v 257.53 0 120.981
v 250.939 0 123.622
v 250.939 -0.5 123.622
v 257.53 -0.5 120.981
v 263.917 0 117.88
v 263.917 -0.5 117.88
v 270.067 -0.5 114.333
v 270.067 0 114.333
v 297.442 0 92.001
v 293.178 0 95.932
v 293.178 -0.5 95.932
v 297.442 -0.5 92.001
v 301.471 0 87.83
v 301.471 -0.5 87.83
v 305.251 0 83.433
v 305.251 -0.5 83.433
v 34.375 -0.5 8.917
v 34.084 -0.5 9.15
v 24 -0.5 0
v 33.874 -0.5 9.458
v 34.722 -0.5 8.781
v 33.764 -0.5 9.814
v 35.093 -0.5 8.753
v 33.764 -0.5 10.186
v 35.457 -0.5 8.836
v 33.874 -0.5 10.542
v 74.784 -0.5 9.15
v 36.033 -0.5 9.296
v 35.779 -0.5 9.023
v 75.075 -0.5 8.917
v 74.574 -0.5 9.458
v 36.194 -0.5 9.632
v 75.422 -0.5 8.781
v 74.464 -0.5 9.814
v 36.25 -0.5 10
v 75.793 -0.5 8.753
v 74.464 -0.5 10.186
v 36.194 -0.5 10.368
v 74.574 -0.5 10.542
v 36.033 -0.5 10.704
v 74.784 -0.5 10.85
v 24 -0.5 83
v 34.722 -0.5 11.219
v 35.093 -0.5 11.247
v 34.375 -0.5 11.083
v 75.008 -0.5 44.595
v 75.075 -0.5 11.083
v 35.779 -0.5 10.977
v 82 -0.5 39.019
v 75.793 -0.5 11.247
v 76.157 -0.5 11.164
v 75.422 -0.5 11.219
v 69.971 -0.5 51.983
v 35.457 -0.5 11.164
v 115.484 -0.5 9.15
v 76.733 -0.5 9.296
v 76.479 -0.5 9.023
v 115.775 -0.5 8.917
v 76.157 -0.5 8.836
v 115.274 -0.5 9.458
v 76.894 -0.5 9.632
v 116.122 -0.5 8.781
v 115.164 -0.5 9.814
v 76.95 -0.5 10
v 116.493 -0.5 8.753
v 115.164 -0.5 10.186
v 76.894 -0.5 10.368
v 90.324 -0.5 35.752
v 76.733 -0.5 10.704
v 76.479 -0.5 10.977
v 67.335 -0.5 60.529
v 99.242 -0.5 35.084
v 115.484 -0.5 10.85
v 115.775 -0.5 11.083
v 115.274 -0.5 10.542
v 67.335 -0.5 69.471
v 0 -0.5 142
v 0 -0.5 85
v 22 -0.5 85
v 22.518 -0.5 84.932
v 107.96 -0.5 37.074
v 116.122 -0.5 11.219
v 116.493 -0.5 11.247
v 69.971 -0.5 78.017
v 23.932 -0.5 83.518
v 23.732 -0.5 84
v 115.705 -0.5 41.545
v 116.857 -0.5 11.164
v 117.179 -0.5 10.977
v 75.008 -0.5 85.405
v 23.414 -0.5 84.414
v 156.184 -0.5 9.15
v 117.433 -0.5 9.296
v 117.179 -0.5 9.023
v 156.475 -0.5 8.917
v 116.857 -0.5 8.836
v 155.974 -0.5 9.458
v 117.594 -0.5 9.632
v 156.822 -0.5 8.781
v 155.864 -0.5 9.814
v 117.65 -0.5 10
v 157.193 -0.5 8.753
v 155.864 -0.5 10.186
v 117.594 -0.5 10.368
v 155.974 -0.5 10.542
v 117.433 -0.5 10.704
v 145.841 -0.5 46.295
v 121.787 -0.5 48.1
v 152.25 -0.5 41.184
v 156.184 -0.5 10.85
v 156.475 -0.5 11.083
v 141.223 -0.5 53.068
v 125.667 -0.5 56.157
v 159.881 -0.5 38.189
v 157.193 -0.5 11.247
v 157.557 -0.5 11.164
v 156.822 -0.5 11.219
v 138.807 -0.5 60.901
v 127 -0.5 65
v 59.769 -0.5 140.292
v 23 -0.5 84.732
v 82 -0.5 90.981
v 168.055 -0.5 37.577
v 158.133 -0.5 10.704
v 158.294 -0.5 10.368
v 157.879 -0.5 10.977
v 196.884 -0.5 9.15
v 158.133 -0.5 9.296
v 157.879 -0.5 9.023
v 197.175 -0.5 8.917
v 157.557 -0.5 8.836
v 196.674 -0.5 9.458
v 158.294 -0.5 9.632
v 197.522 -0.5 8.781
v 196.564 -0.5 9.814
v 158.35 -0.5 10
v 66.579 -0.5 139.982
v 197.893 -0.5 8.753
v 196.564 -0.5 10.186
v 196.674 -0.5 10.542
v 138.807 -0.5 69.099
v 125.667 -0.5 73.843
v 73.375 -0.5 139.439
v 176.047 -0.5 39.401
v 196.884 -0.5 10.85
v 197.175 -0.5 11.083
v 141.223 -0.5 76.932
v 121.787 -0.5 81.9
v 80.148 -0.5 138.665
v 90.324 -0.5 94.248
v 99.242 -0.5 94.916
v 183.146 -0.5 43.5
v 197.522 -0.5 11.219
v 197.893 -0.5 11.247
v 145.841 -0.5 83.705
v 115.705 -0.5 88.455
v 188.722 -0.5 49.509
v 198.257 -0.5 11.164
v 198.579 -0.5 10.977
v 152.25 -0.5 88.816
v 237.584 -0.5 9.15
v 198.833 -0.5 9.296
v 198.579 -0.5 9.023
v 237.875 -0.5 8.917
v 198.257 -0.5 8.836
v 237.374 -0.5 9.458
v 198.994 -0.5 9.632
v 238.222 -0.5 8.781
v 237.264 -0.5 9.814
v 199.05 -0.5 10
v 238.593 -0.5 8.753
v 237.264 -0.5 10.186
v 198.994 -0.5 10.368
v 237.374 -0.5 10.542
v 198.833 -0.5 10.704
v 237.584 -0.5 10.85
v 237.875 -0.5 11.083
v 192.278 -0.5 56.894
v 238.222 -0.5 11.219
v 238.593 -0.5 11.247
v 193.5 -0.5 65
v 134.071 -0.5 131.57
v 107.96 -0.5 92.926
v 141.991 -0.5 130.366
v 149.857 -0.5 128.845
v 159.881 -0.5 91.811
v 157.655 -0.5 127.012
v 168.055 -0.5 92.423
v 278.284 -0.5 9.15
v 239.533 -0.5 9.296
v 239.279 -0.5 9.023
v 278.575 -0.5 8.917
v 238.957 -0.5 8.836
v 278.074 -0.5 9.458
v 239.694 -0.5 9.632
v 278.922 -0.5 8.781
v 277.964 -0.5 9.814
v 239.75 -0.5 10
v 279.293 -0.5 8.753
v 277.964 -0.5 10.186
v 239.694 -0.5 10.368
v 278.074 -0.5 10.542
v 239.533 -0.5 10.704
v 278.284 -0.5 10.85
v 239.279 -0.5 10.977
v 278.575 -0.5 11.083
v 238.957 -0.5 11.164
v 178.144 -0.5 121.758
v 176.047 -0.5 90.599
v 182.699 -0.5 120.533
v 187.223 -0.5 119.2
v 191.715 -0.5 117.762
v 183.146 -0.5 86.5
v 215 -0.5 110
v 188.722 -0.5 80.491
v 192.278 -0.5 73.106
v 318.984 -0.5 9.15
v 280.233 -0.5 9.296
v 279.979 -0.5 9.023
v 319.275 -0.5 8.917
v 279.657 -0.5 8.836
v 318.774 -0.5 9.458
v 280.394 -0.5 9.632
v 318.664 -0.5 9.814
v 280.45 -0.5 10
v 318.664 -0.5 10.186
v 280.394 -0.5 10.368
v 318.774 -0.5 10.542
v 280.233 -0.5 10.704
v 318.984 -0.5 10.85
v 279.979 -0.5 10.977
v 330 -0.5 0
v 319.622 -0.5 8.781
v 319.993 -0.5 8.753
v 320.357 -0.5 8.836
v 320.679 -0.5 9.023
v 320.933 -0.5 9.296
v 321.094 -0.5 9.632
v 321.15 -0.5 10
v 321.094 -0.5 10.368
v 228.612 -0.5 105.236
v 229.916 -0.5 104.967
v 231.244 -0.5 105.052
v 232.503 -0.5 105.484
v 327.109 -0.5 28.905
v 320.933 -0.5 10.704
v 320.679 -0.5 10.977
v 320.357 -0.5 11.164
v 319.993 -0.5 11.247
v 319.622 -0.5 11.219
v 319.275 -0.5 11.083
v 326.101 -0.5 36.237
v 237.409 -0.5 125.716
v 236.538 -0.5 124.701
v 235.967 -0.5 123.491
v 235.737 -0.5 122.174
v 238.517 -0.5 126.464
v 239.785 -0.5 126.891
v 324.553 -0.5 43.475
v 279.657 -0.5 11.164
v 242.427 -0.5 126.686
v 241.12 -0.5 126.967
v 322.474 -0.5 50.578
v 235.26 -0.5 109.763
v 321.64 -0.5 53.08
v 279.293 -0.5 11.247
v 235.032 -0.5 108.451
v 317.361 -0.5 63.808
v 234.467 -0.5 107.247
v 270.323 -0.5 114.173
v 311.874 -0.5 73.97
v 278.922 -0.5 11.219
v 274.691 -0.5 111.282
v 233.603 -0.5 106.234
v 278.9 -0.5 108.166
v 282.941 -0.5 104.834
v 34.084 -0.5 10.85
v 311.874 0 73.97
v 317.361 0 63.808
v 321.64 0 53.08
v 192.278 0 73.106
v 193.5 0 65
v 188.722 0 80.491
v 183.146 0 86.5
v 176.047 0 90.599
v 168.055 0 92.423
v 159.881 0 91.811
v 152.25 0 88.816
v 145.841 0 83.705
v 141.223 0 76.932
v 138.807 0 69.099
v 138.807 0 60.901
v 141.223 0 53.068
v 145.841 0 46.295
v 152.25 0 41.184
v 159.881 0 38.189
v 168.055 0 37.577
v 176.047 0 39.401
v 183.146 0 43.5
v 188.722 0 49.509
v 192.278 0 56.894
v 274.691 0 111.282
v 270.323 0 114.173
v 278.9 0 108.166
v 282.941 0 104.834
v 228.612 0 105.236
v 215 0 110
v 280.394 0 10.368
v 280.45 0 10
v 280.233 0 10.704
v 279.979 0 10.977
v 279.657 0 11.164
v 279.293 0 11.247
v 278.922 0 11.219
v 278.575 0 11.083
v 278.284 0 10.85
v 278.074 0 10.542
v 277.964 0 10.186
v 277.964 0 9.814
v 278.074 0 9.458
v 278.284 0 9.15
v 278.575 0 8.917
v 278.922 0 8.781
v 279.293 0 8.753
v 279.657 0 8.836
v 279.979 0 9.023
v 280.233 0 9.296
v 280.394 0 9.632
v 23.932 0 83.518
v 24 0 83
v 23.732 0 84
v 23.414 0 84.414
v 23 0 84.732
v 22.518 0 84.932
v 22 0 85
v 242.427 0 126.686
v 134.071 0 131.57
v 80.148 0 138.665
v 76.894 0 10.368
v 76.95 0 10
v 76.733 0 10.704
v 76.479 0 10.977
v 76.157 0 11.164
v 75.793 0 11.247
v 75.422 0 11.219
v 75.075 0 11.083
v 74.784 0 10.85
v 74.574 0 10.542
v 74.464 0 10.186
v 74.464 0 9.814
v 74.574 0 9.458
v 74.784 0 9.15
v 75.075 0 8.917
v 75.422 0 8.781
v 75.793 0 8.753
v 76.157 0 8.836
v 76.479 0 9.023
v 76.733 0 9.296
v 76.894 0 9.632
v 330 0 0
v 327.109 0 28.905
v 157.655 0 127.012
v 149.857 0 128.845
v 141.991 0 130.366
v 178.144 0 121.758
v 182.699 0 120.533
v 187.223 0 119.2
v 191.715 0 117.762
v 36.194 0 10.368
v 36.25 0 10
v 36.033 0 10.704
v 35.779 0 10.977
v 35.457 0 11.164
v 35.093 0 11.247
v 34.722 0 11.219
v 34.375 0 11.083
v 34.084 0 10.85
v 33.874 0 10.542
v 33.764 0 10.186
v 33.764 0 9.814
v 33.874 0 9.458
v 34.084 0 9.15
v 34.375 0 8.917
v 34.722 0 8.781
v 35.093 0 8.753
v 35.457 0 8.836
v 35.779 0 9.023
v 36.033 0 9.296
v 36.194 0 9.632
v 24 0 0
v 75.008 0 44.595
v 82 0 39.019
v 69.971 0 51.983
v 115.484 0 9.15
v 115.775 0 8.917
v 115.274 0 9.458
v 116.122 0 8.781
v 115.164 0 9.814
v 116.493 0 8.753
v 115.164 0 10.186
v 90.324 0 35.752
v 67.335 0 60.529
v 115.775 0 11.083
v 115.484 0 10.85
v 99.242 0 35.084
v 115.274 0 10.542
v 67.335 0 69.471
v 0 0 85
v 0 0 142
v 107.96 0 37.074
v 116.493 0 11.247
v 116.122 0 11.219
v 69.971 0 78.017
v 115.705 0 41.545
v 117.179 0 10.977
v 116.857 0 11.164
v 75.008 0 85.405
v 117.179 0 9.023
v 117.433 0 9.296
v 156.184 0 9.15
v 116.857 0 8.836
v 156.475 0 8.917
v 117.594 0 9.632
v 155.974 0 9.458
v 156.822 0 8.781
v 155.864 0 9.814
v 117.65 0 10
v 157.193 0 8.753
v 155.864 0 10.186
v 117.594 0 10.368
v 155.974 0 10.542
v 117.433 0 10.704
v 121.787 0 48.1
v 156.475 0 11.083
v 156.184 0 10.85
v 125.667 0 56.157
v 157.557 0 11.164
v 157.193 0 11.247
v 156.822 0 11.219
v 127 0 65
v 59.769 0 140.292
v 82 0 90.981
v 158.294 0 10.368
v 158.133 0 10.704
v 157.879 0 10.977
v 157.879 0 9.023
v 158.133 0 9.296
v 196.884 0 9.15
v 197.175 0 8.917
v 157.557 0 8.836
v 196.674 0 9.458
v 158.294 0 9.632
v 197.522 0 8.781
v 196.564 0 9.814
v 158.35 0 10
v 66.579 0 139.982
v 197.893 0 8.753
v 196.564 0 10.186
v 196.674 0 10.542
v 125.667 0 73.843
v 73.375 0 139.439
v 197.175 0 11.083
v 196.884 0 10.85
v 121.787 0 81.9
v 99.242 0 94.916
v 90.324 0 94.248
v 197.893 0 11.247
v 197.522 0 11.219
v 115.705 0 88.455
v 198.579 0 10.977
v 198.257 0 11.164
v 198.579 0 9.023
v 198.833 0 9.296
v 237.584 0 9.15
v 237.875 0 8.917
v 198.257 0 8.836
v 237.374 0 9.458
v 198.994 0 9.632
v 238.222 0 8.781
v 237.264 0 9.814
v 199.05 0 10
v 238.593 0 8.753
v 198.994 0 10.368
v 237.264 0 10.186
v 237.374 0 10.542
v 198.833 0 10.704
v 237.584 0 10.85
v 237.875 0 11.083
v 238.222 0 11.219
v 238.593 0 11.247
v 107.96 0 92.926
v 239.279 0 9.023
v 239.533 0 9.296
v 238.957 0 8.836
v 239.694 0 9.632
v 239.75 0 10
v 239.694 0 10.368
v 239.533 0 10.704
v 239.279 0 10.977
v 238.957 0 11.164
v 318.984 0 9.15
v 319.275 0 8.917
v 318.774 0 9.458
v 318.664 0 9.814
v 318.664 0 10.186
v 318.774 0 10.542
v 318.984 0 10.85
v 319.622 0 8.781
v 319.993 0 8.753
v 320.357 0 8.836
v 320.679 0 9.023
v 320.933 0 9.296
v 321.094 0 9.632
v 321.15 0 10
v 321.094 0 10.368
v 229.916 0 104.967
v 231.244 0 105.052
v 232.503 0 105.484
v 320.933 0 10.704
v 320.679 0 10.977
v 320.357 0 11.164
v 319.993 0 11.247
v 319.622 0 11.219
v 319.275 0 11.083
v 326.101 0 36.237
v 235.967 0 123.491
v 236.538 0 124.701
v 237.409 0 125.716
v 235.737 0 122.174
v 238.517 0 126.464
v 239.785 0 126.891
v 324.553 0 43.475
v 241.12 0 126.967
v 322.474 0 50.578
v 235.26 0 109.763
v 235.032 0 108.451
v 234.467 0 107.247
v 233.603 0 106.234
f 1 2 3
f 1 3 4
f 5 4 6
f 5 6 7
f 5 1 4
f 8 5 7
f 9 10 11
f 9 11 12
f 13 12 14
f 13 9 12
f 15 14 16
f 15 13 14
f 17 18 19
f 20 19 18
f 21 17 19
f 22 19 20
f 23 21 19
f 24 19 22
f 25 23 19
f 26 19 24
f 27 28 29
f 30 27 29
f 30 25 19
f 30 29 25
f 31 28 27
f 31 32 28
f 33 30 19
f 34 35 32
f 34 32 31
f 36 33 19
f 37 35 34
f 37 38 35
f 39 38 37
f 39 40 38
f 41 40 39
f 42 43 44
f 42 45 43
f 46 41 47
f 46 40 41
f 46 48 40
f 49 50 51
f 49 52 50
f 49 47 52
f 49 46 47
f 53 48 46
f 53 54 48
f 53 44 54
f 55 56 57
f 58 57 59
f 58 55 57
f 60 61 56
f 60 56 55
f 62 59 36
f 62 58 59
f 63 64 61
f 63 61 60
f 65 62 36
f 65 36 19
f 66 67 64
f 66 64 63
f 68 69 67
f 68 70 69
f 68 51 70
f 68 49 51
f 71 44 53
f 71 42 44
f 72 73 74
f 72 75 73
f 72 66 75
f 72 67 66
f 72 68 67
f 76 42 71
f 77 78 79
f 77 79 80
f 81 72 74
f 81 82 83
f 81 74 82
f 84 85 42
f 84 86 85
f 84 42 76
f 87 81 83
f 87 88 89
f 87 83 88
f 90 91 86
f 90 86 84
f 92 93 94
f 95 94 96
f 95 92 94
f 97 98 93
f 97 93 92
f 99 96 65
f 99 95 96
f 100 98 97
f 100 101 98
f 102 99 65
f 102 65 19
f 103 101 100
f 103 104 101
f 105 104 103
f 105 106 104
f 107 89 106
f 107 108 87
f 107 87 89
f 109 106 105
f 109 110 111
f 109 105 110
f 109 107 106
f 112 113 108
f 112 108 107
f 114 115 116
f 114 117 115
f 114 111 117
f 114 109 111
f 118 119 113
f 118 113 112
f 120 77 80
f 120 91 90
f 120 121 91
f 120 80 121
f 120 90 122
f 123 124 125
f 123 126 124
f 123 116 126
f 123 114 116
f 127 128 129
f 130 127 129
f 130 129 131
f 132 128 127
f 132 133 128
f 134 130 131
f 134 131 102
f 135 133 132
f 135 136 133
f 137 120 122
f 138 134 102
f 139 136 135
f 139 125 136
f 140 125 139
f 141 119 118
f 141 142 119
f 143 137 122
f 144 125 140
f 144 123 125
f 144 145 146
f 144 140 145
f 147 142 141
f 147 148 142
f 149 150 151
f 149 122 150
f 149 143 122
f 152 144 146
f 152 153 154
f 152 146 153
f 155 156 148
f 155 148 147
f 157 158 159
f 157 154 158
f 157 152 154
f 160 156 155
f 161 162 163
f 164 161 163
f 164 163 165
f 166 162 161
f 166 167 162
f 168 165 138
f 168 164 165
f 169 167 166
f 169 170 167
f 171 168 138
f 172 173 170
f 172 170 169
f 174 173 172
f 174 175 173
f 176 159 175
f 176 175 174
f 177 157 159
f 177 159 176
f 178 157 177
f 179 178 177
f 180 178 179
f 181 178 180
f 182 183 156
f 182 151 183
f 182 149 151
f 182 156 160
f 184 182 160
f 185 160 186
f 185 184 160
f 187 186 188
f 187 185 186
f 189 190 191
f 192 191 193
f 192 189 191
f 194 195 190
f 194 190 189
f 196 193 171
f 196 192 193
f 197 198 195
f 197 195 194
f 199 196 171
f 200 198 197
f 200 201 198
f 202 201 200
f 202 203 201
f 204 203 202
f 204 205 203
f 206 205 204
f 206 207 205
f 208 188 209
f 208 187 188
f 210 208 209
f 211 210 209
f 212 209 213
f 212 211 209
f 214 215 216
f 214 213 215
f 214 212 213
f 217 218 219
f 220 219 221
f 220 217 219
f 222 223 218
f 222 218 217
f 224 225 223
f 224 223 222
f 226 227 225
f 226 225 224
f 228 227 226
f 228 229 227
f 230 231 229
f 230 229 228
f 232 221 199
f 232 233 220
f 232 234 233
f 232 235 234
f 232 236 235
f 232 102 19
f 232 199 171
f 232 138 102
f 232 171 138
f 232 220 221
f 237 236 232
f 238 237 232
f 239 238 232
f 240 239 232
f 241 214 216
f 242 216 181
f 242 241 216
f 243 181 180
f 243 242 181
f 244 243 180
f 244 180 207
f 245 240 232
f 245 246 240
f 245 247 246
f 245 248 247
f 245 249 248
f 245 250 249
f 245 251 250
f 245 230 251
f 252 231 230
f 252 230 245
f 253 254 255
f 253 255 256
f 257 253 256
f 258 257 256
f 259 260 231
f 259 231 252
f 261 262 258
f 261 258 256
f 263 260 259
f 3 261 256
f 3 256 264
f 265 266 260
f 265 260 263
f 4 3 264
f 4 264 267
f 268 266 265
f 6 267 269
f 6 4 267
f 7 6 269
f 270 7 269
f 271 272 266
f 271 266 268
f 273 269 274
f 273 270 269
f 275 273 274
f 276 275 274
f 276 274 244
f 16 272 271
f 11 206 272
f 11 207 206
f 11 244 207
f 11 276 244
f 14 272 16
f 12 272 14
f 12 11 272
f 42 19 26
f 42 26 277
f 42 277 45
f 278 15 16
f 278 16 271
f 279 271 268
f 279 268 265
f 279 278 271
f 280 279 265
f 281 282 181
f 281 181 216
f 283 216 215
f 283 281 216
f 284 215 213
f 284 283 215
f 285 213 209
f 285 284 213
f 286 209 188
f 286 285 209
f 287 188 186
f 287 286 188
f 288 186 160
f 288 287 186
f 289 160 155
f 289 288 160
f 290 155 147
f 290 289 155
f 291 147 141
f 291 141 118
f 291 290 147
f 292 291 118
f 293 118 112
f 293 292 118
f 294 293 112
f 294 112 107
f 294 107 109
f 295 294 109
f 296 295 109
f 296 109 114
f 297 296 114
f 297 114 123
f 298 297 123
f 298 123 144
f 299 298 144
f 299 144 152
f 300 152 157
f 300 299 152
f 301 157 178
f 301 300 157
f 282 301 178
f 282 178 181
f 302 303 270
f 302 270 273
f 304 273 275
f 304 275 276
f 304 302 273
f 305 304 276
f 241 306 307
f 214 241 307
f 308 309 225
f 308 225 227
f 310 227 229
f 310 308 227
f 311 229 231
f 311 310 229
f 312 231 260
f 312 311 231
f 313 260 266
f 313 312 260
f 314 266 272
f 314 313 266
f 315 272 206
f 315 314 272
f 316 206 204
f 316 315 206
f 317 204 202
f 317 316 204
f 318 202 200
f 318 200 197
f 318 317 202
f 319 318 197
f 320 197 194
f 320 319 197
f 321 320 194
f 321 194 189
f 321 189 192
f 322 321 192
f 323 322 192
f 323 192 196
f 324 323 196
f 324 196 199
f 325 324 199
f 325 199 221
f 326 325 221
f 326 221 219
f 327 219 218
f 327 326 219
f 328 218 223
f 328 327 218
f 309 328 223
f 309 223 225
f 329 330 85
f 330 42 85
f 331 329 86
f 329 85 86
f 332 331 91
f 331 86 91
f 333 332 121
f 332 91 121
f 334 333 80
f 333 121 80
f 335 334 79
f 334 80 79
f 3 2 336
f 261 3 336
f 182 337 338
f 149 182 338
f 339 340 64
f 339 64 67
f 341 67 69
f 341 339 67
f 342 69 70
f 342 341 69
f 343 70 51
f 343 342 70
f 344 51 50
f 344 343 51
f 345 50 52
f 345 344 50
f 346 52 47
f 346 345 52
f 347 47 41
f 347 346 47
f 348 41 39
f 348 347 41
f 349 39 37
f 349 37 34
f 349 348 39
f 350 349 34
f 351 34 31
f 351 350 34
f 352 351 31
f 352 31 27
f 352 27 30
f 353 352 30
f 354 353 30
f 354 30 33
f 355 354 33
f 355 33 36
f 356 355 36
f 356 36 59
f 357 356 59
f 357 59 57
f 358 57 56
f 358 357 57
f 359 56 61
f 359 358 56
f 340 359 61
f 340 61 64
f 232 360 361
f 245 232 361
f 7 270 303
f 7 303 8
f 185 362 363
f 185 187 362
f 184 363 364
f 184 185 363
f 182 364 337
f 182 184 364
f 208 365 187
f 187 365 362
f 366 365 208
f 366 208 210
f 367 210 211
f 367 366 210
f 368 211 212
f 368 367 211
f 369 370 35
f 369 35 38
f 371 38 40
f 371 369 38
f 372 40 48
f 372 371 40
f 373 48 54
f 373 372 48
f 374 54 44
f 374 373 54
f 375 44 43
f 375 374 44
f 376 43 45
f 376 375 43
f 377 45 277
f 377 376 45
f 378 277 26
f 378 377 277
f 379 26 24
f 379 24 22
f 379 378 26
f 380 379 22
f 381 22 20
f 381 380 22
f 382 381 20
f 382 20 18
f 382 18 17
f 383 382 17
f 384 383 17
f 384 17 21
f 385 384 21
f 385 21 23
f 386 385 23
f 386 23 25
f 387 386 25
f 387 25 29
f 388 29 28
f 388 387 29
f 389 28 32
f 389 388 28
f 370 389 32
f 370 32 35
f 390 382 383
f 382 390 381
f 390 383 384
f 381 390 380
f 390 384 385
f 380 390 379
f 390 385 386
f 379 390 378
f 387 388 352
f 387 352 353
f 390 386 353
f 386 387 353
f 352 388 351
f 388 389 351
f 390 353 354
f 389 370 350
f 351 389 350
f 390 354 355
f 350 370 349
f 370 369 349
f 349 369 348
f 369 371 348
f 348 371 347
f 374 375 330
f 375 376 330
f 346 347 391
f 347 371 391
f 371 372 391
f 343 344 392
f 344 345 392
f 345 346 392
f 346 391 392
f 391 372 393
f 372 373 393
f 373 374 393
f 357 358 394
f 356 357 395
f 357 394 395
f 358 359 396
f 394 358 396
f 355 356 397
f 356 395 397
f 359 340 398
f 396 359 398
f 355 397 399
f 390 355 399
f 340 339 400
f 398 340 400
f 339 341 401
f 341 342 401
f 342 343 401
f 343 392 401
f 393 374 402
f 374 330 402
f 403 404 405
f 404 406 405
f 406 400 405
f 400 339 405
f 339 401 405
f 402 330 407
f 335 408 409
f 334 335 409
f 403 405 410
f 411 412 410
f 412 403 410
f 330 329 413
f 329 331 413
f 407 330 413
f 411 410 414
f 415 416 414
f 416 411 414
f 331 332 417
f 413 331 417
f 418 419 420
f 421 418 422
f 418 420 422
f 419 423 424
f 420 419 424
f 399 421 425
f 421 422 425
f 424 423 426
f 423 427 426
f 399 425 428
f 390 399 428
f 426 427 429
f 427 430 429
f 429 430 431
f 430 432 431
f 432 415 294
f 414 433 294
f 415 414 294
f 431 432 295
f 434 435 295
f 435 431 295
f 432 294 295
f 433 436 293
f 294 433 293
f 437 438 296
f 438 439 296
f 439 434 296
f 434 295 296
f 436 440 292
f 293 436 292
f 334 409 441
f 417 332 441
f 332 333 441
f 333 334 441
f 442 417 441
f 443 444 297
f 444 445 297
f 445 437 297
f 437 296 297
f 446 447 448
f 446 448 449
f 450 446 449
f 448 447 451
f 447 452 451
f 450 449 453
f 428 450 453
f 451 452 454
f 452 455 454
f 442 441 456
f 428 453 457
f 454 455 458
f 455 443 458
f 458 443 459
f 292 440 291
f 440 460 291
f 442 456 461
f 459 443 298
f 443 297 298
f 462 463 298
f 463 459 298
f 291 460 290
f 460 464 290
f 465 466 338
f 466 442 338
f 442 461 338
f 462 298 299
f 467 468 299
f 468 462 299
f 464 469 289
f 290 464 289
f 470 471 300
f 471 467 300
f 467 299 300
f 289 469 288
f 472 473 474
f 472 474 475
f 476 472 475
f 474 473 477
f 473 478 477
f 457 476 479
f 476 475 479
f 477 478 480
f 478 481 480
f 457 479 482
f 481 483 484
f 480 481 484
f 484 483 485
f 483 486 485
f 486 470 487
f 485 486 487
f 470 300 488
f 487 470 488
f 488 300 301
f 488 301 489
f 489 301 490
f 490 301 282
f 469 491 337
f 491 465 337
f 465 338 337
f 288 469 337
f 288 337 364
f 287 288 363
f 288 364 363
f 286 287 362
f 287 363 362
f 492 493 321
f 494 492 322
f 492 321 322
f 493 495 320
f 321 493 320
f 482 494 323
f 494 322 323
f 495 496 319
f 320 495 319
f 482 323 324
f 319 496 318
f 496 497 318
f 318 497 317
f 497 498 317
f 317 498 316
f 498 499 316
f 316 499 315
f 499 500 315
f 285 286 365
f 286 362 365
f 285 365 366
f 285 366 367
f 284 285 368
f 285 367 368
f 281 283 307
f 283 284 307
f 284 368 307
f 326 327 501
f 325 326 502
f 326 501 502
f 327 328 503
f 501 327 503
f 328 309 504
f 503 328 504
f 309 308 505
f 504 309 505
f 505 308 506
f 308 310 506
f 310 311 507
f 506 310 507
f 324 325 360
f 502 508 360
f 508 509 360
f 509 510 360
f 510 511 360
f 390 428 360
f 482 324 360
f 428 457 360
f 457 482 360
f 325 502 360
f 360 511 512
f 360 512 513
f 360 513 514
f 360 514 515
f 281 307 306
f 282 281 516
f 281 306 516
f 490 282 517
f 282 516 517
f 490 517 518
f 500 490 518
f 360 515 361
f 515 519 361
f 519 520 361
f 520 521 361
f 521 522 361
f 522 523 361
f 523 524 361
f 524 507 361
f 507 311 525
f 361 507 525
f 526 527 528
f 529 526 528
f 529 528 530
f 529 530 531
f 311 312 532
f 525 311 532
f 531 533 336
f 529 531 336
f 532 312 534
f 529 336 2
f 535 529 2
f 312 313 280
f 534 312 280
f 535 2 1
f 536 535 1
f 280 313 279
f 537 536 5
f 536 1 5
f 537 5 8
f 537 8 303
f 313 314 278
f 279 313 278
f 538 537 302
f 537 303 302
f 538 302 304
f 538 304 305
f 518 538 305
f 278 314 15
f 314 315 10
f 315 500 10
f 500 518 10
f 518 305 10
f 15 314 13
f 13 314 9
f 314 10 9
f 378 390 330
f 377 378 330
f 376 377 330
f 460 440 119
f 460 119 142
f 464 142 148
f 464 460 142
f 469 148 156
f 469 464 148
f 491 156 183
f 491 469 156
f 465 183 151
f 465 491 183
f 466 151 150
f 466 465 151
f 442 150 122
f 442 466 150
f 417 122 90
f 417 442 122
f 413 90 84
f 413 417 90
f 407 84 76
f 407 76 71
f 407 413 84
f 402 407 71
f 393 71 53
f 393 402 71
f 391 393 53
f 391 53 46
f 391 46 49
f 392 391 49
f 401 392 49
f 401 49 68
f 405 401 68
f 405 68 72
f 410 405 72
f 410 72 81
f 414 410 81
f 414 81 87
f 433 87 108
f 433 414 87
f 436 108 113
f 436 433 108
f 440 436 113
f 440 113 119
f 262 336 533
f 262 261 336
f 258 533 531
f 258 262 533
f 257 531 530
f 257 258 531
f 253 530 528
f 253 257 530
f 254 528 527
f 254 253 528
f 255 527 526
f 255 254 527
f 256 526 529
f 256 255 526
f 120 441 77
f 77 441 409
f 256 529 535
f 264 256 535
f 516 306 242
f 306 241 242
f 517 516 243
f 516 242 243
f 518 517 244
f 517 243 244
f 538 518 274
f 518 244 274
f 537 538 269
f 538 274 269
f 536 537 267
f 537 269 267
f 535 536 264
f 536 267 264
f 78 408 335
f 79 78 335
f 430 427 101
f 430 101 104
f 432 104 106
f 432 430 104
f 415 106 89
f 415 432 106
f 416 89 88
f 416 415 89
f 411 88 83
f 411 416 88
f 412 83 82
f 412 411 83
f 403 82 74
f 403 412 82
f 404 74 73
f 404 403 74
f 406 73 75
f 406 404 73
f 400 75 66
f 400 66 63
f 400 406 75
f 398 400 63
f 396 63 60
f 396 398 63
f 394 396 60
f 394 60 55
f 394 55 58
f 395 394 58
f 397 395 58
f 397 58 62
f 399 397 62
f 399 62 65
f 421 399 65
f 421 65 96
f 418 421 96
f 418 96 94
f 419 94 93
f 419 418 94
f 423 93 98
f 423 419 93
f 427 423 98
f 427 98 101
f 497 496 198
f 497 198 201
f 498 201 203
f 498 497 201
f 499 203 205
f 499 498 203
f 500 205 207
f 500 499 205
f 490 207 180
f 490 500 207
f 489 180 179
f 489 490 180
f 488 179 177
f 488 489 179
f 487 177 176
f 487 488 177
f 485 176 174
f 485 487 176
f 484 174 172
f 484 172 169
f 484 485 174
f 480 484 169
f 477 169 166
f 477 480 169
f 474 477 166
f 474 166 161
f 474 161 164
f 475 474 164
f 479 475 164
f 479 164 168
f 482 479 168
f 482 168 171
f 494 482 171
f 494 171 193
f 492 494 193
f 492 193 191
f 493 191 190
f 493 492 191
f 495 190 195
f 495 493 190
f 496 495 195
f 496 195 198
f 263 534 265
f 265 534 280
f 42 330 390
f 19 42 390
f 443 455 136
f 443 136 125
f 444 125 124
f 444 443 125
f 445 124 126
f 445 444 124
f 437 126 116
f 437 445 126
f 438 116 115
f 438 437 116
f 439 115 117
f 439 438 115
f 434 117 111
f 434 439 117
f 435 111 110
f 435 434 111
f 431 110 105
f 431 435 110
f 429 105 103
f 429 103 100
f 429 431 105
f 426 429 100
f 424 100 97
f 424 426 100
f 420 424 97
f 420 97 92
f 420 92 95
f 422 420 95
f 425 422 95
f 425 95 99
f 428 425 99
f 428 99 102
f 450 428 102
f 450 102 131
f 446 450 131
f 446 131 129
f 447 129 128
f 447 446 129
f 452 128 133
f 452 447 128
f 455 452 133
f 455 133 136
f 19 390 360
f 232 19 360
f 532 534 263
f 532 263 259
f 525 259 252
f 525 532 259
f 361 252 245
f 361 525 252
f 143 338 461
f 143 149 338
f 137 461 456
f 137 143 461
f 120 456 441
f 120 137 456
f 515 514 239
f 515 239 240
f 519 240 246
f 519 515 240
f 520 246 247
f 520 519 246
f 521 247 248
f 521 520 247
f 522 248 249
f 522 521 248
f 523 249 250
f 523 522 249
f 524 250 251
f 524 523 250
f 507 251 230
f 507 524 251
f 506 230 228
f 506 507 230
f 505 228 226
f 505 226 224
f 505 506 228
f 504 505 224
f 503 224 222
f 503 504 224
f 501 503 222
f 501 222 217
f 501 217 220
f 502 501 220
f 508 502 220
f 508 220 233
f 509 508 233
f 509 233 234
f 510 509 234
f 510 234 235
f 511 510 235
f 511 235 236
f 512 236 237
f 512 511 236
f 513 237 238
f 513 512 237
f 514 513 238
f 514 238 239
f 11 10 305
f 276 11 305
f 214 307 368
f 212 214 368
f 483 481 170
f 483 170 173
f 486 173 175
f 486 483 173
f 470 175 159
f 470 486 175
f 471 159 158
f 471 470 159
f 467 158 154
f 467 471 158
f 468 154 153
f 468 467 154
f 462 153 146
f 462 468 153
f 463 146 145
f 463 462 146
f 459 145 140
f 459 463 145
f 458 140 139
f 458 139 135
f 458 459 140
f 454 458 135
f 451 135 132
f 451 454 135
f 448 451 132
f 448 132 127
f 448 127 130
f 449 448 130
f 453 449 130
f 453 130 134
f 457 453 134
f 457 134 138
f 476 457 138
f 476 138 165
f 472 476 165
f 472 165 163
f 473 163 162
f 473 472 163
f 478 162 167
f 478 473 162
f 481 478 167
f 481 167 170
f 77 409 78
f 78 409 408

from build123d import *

# Parameters (mm, degrees)
F0_R        = 1.25
F0_R_2      = 30
F0_R_3      = 27.5
F1_DEPTH    = 0.5
F2_R        = 2
F3_R        = 5
F4_R        = 200
F5_T1_DEPTH = 35.8886959127
F6_T1_DEPTH = 56.2497974387
F6_T3_DEPTH = 89.6754808083
F6_T5_DEPTH = 45.7004795966
F6_T7_DEPTH = 39.8671139621
F6_T9_DEPTH = 53.963301214


# Not quite as in the source:
# - a fillet or chamfer that OpenCascade refuses, or shapes differently, is made with other operations: its cross-section is extruded or revolved along the edge and cut away or added


with BuildPart() as f1:
    # F0 (on Front) → F1 (new body)
    with BuildSketch(Plane.XZ):
        Polygon((24, 85), (24, 0), (330, 0), (326, 40), (316, 70), (300, 90), (277, 110), (261, 120), (236, 129), (235, 103), (215, 110), (185, 120), (146, 130), (70, 140), (0, 142), (0, 85), align=None)
        with Locations((35, 10)):
            Circle(F0_R, mode=Mode.SUBTRACT)
        with Locations((75.7, 10)):
            Circle(F0_R, mode=Mode.SUBTRACT)
        with Locations((116.4, 10)):
            Circle(F0_R, mode=Mode.SUBTRACT)
        with Locations((157.1, 10)):
            Circle(F0_R, mode=Mode.SUBTRACT)
        with Locations((97, 65)):
            Circle(F0_R_2, mode=Mode.SUBTRACT)
        with Locations((197.8, 10)):
            Circle(F0_R, mode=Mode.SUBTRACT)
        with Locations((238.5, 10)):
            Circle(F0_R, mode=Mode.SUBTRACT)
        with Locations((279.2, 10)):
            Circle(F0_R, mode=Mode.SUBTRACT)
        with Locations((319.9, 10)):
            Circle(F0_R, mode=Mode.SUBTRACT)
        with Locations((166, 65)):
            Circle(F0_R_3, mode=Mode.SUBTRACT)
    extrude(amount=F1_DEPTH)

    # F2
    f2_edges = [f1.edges().sort_by_distance(p)[0] for p in [
        (24, -0.25, 85),
    ]]
    fillet(f2_edges, radius=F2_R)

    # F3
    f3_edges = [f1.edges().sort_by_distance(p)[0] for p in [
        (235, -0.25, 103),
        (236, -0.25, 129),
    ]]
    fillet(f3_edges, radius=F3_R)

    # F4
    f4_edges = [f1.edges().sort_by_distance(p)[0] for p in [
        (70, -0.25, 140),
        (146, -0.25, 130),
    ]]
    fillet(f4_edges, radius=F4_R)

    # F5: fillet of radius 200 on 1 edges, made by hand

    # F5_s2 → F5_t1 (cut)
    with BuildSketch(Plane.XZ.offset(-17.6943479563)):
        with BuildLine():
            ThreePointArc((178.1440498006, 121.7579359486), (184.9646346256, 119.8799020084), (191.7145329504, 117.7618223499))
            Line((191.7145329504, 117.7618223499), (185, 120))
            Line((185, 120), (178.1440498006, 121.7579359486))
        make_face()
    extrude(amount=F5_T1_DEPTH, mode=Mode.SUBTRACT)

    # F6: fillet of radius 100 on 5 edges, made by hand

    # F6_s2 → F6_t1 (cut)
    with BuildSketch(Plane.XZ.offset(-27.8748987193)):
        with BuildLine():
            ThreePointArc((322.47407322, 50.57778034), (325.3940178786, 39.8703898792), (327.109462436, 28.9053756404))
            Line((327.109462436, 28.9053756404), (326, 40))
            Line((326, 40), (322.47407322, 50.57778034))
        make_face()
    extrude(amount=F6_T1_DEPTH, mode=Mode.SUBTRACT)

    # F6_s4 → F6_t3 (cut)
    with BuildSketch(Plane.XZ.offset(-44.5877404042)):
        with BuildLine():
            ThreePointArc((304.8585037552, 83.9268703061), (314.6138472293, 69.2458956516), (321.6399526159, 53.0801421523))
            Line((321.6399526159, 53.0801421523), (316, 70))
            Line((316, 70), (304.8585037552, 83.9268703061))
        make_face()
    extrude(amount=F6_T3_DEPTH, mode=Mode.SUBTRACT)

    # F6_s6 → F6_t5 (cut)
    with BuildSketch(Plane.XZ.offset(-22.6002397983)):
        with BuildLine():
            ThreePointArc((293.1782936984, 95.9319185231), (299.7058017999, 89.7176239908), (305.6473031502, 82.9408710622))
            Line((305.6473031502, 82.9408710622), (300, 90))
            Line((300, 90), (293.1782936984, 95.9319185231))
        make_face()
    extrude(amount=F6_T5_DEPTH, mode=Mode.SUBTRACT)

    # F6_s8 → F6_t7 (cut)
    with BuildSketch(Plane.XZ.offset(-19.683556981)):
        with BuildLine():
            ThreePointArc((270.3233508253, 114.1729057342), (276.8158857708, 109.7512495983), (282.9413283175, 104.83362755))
            Line((282.9413283175, 104.83362755), (277, 110))
            Line((277, 110), (270.3233508253, 114.1729057342))
        make_face()
    extrude(amount=F6_T7_DEPTH, mode=Mode.SUBTRACT)

    # F6_s10 → F6_t9 (cut)
    with BuildSketch(Plane.XZ.offset(-26.731650607)):
        with BuildLine():
            ThreePointArc((250.9394105782, 123.6218121919), (260.7509863663, 119.487225172), (270.0673577512, 114.3329014055))
            Line((270.0673577512, 114.3329014055), (261, 120))
            Line((261, 120), (250.9394105782, 123.6218121919))
        make_face()
    extrude(amount=F6_T9_DEPTH, mode=Mode.SUBTRACT)


solid = f1.part
